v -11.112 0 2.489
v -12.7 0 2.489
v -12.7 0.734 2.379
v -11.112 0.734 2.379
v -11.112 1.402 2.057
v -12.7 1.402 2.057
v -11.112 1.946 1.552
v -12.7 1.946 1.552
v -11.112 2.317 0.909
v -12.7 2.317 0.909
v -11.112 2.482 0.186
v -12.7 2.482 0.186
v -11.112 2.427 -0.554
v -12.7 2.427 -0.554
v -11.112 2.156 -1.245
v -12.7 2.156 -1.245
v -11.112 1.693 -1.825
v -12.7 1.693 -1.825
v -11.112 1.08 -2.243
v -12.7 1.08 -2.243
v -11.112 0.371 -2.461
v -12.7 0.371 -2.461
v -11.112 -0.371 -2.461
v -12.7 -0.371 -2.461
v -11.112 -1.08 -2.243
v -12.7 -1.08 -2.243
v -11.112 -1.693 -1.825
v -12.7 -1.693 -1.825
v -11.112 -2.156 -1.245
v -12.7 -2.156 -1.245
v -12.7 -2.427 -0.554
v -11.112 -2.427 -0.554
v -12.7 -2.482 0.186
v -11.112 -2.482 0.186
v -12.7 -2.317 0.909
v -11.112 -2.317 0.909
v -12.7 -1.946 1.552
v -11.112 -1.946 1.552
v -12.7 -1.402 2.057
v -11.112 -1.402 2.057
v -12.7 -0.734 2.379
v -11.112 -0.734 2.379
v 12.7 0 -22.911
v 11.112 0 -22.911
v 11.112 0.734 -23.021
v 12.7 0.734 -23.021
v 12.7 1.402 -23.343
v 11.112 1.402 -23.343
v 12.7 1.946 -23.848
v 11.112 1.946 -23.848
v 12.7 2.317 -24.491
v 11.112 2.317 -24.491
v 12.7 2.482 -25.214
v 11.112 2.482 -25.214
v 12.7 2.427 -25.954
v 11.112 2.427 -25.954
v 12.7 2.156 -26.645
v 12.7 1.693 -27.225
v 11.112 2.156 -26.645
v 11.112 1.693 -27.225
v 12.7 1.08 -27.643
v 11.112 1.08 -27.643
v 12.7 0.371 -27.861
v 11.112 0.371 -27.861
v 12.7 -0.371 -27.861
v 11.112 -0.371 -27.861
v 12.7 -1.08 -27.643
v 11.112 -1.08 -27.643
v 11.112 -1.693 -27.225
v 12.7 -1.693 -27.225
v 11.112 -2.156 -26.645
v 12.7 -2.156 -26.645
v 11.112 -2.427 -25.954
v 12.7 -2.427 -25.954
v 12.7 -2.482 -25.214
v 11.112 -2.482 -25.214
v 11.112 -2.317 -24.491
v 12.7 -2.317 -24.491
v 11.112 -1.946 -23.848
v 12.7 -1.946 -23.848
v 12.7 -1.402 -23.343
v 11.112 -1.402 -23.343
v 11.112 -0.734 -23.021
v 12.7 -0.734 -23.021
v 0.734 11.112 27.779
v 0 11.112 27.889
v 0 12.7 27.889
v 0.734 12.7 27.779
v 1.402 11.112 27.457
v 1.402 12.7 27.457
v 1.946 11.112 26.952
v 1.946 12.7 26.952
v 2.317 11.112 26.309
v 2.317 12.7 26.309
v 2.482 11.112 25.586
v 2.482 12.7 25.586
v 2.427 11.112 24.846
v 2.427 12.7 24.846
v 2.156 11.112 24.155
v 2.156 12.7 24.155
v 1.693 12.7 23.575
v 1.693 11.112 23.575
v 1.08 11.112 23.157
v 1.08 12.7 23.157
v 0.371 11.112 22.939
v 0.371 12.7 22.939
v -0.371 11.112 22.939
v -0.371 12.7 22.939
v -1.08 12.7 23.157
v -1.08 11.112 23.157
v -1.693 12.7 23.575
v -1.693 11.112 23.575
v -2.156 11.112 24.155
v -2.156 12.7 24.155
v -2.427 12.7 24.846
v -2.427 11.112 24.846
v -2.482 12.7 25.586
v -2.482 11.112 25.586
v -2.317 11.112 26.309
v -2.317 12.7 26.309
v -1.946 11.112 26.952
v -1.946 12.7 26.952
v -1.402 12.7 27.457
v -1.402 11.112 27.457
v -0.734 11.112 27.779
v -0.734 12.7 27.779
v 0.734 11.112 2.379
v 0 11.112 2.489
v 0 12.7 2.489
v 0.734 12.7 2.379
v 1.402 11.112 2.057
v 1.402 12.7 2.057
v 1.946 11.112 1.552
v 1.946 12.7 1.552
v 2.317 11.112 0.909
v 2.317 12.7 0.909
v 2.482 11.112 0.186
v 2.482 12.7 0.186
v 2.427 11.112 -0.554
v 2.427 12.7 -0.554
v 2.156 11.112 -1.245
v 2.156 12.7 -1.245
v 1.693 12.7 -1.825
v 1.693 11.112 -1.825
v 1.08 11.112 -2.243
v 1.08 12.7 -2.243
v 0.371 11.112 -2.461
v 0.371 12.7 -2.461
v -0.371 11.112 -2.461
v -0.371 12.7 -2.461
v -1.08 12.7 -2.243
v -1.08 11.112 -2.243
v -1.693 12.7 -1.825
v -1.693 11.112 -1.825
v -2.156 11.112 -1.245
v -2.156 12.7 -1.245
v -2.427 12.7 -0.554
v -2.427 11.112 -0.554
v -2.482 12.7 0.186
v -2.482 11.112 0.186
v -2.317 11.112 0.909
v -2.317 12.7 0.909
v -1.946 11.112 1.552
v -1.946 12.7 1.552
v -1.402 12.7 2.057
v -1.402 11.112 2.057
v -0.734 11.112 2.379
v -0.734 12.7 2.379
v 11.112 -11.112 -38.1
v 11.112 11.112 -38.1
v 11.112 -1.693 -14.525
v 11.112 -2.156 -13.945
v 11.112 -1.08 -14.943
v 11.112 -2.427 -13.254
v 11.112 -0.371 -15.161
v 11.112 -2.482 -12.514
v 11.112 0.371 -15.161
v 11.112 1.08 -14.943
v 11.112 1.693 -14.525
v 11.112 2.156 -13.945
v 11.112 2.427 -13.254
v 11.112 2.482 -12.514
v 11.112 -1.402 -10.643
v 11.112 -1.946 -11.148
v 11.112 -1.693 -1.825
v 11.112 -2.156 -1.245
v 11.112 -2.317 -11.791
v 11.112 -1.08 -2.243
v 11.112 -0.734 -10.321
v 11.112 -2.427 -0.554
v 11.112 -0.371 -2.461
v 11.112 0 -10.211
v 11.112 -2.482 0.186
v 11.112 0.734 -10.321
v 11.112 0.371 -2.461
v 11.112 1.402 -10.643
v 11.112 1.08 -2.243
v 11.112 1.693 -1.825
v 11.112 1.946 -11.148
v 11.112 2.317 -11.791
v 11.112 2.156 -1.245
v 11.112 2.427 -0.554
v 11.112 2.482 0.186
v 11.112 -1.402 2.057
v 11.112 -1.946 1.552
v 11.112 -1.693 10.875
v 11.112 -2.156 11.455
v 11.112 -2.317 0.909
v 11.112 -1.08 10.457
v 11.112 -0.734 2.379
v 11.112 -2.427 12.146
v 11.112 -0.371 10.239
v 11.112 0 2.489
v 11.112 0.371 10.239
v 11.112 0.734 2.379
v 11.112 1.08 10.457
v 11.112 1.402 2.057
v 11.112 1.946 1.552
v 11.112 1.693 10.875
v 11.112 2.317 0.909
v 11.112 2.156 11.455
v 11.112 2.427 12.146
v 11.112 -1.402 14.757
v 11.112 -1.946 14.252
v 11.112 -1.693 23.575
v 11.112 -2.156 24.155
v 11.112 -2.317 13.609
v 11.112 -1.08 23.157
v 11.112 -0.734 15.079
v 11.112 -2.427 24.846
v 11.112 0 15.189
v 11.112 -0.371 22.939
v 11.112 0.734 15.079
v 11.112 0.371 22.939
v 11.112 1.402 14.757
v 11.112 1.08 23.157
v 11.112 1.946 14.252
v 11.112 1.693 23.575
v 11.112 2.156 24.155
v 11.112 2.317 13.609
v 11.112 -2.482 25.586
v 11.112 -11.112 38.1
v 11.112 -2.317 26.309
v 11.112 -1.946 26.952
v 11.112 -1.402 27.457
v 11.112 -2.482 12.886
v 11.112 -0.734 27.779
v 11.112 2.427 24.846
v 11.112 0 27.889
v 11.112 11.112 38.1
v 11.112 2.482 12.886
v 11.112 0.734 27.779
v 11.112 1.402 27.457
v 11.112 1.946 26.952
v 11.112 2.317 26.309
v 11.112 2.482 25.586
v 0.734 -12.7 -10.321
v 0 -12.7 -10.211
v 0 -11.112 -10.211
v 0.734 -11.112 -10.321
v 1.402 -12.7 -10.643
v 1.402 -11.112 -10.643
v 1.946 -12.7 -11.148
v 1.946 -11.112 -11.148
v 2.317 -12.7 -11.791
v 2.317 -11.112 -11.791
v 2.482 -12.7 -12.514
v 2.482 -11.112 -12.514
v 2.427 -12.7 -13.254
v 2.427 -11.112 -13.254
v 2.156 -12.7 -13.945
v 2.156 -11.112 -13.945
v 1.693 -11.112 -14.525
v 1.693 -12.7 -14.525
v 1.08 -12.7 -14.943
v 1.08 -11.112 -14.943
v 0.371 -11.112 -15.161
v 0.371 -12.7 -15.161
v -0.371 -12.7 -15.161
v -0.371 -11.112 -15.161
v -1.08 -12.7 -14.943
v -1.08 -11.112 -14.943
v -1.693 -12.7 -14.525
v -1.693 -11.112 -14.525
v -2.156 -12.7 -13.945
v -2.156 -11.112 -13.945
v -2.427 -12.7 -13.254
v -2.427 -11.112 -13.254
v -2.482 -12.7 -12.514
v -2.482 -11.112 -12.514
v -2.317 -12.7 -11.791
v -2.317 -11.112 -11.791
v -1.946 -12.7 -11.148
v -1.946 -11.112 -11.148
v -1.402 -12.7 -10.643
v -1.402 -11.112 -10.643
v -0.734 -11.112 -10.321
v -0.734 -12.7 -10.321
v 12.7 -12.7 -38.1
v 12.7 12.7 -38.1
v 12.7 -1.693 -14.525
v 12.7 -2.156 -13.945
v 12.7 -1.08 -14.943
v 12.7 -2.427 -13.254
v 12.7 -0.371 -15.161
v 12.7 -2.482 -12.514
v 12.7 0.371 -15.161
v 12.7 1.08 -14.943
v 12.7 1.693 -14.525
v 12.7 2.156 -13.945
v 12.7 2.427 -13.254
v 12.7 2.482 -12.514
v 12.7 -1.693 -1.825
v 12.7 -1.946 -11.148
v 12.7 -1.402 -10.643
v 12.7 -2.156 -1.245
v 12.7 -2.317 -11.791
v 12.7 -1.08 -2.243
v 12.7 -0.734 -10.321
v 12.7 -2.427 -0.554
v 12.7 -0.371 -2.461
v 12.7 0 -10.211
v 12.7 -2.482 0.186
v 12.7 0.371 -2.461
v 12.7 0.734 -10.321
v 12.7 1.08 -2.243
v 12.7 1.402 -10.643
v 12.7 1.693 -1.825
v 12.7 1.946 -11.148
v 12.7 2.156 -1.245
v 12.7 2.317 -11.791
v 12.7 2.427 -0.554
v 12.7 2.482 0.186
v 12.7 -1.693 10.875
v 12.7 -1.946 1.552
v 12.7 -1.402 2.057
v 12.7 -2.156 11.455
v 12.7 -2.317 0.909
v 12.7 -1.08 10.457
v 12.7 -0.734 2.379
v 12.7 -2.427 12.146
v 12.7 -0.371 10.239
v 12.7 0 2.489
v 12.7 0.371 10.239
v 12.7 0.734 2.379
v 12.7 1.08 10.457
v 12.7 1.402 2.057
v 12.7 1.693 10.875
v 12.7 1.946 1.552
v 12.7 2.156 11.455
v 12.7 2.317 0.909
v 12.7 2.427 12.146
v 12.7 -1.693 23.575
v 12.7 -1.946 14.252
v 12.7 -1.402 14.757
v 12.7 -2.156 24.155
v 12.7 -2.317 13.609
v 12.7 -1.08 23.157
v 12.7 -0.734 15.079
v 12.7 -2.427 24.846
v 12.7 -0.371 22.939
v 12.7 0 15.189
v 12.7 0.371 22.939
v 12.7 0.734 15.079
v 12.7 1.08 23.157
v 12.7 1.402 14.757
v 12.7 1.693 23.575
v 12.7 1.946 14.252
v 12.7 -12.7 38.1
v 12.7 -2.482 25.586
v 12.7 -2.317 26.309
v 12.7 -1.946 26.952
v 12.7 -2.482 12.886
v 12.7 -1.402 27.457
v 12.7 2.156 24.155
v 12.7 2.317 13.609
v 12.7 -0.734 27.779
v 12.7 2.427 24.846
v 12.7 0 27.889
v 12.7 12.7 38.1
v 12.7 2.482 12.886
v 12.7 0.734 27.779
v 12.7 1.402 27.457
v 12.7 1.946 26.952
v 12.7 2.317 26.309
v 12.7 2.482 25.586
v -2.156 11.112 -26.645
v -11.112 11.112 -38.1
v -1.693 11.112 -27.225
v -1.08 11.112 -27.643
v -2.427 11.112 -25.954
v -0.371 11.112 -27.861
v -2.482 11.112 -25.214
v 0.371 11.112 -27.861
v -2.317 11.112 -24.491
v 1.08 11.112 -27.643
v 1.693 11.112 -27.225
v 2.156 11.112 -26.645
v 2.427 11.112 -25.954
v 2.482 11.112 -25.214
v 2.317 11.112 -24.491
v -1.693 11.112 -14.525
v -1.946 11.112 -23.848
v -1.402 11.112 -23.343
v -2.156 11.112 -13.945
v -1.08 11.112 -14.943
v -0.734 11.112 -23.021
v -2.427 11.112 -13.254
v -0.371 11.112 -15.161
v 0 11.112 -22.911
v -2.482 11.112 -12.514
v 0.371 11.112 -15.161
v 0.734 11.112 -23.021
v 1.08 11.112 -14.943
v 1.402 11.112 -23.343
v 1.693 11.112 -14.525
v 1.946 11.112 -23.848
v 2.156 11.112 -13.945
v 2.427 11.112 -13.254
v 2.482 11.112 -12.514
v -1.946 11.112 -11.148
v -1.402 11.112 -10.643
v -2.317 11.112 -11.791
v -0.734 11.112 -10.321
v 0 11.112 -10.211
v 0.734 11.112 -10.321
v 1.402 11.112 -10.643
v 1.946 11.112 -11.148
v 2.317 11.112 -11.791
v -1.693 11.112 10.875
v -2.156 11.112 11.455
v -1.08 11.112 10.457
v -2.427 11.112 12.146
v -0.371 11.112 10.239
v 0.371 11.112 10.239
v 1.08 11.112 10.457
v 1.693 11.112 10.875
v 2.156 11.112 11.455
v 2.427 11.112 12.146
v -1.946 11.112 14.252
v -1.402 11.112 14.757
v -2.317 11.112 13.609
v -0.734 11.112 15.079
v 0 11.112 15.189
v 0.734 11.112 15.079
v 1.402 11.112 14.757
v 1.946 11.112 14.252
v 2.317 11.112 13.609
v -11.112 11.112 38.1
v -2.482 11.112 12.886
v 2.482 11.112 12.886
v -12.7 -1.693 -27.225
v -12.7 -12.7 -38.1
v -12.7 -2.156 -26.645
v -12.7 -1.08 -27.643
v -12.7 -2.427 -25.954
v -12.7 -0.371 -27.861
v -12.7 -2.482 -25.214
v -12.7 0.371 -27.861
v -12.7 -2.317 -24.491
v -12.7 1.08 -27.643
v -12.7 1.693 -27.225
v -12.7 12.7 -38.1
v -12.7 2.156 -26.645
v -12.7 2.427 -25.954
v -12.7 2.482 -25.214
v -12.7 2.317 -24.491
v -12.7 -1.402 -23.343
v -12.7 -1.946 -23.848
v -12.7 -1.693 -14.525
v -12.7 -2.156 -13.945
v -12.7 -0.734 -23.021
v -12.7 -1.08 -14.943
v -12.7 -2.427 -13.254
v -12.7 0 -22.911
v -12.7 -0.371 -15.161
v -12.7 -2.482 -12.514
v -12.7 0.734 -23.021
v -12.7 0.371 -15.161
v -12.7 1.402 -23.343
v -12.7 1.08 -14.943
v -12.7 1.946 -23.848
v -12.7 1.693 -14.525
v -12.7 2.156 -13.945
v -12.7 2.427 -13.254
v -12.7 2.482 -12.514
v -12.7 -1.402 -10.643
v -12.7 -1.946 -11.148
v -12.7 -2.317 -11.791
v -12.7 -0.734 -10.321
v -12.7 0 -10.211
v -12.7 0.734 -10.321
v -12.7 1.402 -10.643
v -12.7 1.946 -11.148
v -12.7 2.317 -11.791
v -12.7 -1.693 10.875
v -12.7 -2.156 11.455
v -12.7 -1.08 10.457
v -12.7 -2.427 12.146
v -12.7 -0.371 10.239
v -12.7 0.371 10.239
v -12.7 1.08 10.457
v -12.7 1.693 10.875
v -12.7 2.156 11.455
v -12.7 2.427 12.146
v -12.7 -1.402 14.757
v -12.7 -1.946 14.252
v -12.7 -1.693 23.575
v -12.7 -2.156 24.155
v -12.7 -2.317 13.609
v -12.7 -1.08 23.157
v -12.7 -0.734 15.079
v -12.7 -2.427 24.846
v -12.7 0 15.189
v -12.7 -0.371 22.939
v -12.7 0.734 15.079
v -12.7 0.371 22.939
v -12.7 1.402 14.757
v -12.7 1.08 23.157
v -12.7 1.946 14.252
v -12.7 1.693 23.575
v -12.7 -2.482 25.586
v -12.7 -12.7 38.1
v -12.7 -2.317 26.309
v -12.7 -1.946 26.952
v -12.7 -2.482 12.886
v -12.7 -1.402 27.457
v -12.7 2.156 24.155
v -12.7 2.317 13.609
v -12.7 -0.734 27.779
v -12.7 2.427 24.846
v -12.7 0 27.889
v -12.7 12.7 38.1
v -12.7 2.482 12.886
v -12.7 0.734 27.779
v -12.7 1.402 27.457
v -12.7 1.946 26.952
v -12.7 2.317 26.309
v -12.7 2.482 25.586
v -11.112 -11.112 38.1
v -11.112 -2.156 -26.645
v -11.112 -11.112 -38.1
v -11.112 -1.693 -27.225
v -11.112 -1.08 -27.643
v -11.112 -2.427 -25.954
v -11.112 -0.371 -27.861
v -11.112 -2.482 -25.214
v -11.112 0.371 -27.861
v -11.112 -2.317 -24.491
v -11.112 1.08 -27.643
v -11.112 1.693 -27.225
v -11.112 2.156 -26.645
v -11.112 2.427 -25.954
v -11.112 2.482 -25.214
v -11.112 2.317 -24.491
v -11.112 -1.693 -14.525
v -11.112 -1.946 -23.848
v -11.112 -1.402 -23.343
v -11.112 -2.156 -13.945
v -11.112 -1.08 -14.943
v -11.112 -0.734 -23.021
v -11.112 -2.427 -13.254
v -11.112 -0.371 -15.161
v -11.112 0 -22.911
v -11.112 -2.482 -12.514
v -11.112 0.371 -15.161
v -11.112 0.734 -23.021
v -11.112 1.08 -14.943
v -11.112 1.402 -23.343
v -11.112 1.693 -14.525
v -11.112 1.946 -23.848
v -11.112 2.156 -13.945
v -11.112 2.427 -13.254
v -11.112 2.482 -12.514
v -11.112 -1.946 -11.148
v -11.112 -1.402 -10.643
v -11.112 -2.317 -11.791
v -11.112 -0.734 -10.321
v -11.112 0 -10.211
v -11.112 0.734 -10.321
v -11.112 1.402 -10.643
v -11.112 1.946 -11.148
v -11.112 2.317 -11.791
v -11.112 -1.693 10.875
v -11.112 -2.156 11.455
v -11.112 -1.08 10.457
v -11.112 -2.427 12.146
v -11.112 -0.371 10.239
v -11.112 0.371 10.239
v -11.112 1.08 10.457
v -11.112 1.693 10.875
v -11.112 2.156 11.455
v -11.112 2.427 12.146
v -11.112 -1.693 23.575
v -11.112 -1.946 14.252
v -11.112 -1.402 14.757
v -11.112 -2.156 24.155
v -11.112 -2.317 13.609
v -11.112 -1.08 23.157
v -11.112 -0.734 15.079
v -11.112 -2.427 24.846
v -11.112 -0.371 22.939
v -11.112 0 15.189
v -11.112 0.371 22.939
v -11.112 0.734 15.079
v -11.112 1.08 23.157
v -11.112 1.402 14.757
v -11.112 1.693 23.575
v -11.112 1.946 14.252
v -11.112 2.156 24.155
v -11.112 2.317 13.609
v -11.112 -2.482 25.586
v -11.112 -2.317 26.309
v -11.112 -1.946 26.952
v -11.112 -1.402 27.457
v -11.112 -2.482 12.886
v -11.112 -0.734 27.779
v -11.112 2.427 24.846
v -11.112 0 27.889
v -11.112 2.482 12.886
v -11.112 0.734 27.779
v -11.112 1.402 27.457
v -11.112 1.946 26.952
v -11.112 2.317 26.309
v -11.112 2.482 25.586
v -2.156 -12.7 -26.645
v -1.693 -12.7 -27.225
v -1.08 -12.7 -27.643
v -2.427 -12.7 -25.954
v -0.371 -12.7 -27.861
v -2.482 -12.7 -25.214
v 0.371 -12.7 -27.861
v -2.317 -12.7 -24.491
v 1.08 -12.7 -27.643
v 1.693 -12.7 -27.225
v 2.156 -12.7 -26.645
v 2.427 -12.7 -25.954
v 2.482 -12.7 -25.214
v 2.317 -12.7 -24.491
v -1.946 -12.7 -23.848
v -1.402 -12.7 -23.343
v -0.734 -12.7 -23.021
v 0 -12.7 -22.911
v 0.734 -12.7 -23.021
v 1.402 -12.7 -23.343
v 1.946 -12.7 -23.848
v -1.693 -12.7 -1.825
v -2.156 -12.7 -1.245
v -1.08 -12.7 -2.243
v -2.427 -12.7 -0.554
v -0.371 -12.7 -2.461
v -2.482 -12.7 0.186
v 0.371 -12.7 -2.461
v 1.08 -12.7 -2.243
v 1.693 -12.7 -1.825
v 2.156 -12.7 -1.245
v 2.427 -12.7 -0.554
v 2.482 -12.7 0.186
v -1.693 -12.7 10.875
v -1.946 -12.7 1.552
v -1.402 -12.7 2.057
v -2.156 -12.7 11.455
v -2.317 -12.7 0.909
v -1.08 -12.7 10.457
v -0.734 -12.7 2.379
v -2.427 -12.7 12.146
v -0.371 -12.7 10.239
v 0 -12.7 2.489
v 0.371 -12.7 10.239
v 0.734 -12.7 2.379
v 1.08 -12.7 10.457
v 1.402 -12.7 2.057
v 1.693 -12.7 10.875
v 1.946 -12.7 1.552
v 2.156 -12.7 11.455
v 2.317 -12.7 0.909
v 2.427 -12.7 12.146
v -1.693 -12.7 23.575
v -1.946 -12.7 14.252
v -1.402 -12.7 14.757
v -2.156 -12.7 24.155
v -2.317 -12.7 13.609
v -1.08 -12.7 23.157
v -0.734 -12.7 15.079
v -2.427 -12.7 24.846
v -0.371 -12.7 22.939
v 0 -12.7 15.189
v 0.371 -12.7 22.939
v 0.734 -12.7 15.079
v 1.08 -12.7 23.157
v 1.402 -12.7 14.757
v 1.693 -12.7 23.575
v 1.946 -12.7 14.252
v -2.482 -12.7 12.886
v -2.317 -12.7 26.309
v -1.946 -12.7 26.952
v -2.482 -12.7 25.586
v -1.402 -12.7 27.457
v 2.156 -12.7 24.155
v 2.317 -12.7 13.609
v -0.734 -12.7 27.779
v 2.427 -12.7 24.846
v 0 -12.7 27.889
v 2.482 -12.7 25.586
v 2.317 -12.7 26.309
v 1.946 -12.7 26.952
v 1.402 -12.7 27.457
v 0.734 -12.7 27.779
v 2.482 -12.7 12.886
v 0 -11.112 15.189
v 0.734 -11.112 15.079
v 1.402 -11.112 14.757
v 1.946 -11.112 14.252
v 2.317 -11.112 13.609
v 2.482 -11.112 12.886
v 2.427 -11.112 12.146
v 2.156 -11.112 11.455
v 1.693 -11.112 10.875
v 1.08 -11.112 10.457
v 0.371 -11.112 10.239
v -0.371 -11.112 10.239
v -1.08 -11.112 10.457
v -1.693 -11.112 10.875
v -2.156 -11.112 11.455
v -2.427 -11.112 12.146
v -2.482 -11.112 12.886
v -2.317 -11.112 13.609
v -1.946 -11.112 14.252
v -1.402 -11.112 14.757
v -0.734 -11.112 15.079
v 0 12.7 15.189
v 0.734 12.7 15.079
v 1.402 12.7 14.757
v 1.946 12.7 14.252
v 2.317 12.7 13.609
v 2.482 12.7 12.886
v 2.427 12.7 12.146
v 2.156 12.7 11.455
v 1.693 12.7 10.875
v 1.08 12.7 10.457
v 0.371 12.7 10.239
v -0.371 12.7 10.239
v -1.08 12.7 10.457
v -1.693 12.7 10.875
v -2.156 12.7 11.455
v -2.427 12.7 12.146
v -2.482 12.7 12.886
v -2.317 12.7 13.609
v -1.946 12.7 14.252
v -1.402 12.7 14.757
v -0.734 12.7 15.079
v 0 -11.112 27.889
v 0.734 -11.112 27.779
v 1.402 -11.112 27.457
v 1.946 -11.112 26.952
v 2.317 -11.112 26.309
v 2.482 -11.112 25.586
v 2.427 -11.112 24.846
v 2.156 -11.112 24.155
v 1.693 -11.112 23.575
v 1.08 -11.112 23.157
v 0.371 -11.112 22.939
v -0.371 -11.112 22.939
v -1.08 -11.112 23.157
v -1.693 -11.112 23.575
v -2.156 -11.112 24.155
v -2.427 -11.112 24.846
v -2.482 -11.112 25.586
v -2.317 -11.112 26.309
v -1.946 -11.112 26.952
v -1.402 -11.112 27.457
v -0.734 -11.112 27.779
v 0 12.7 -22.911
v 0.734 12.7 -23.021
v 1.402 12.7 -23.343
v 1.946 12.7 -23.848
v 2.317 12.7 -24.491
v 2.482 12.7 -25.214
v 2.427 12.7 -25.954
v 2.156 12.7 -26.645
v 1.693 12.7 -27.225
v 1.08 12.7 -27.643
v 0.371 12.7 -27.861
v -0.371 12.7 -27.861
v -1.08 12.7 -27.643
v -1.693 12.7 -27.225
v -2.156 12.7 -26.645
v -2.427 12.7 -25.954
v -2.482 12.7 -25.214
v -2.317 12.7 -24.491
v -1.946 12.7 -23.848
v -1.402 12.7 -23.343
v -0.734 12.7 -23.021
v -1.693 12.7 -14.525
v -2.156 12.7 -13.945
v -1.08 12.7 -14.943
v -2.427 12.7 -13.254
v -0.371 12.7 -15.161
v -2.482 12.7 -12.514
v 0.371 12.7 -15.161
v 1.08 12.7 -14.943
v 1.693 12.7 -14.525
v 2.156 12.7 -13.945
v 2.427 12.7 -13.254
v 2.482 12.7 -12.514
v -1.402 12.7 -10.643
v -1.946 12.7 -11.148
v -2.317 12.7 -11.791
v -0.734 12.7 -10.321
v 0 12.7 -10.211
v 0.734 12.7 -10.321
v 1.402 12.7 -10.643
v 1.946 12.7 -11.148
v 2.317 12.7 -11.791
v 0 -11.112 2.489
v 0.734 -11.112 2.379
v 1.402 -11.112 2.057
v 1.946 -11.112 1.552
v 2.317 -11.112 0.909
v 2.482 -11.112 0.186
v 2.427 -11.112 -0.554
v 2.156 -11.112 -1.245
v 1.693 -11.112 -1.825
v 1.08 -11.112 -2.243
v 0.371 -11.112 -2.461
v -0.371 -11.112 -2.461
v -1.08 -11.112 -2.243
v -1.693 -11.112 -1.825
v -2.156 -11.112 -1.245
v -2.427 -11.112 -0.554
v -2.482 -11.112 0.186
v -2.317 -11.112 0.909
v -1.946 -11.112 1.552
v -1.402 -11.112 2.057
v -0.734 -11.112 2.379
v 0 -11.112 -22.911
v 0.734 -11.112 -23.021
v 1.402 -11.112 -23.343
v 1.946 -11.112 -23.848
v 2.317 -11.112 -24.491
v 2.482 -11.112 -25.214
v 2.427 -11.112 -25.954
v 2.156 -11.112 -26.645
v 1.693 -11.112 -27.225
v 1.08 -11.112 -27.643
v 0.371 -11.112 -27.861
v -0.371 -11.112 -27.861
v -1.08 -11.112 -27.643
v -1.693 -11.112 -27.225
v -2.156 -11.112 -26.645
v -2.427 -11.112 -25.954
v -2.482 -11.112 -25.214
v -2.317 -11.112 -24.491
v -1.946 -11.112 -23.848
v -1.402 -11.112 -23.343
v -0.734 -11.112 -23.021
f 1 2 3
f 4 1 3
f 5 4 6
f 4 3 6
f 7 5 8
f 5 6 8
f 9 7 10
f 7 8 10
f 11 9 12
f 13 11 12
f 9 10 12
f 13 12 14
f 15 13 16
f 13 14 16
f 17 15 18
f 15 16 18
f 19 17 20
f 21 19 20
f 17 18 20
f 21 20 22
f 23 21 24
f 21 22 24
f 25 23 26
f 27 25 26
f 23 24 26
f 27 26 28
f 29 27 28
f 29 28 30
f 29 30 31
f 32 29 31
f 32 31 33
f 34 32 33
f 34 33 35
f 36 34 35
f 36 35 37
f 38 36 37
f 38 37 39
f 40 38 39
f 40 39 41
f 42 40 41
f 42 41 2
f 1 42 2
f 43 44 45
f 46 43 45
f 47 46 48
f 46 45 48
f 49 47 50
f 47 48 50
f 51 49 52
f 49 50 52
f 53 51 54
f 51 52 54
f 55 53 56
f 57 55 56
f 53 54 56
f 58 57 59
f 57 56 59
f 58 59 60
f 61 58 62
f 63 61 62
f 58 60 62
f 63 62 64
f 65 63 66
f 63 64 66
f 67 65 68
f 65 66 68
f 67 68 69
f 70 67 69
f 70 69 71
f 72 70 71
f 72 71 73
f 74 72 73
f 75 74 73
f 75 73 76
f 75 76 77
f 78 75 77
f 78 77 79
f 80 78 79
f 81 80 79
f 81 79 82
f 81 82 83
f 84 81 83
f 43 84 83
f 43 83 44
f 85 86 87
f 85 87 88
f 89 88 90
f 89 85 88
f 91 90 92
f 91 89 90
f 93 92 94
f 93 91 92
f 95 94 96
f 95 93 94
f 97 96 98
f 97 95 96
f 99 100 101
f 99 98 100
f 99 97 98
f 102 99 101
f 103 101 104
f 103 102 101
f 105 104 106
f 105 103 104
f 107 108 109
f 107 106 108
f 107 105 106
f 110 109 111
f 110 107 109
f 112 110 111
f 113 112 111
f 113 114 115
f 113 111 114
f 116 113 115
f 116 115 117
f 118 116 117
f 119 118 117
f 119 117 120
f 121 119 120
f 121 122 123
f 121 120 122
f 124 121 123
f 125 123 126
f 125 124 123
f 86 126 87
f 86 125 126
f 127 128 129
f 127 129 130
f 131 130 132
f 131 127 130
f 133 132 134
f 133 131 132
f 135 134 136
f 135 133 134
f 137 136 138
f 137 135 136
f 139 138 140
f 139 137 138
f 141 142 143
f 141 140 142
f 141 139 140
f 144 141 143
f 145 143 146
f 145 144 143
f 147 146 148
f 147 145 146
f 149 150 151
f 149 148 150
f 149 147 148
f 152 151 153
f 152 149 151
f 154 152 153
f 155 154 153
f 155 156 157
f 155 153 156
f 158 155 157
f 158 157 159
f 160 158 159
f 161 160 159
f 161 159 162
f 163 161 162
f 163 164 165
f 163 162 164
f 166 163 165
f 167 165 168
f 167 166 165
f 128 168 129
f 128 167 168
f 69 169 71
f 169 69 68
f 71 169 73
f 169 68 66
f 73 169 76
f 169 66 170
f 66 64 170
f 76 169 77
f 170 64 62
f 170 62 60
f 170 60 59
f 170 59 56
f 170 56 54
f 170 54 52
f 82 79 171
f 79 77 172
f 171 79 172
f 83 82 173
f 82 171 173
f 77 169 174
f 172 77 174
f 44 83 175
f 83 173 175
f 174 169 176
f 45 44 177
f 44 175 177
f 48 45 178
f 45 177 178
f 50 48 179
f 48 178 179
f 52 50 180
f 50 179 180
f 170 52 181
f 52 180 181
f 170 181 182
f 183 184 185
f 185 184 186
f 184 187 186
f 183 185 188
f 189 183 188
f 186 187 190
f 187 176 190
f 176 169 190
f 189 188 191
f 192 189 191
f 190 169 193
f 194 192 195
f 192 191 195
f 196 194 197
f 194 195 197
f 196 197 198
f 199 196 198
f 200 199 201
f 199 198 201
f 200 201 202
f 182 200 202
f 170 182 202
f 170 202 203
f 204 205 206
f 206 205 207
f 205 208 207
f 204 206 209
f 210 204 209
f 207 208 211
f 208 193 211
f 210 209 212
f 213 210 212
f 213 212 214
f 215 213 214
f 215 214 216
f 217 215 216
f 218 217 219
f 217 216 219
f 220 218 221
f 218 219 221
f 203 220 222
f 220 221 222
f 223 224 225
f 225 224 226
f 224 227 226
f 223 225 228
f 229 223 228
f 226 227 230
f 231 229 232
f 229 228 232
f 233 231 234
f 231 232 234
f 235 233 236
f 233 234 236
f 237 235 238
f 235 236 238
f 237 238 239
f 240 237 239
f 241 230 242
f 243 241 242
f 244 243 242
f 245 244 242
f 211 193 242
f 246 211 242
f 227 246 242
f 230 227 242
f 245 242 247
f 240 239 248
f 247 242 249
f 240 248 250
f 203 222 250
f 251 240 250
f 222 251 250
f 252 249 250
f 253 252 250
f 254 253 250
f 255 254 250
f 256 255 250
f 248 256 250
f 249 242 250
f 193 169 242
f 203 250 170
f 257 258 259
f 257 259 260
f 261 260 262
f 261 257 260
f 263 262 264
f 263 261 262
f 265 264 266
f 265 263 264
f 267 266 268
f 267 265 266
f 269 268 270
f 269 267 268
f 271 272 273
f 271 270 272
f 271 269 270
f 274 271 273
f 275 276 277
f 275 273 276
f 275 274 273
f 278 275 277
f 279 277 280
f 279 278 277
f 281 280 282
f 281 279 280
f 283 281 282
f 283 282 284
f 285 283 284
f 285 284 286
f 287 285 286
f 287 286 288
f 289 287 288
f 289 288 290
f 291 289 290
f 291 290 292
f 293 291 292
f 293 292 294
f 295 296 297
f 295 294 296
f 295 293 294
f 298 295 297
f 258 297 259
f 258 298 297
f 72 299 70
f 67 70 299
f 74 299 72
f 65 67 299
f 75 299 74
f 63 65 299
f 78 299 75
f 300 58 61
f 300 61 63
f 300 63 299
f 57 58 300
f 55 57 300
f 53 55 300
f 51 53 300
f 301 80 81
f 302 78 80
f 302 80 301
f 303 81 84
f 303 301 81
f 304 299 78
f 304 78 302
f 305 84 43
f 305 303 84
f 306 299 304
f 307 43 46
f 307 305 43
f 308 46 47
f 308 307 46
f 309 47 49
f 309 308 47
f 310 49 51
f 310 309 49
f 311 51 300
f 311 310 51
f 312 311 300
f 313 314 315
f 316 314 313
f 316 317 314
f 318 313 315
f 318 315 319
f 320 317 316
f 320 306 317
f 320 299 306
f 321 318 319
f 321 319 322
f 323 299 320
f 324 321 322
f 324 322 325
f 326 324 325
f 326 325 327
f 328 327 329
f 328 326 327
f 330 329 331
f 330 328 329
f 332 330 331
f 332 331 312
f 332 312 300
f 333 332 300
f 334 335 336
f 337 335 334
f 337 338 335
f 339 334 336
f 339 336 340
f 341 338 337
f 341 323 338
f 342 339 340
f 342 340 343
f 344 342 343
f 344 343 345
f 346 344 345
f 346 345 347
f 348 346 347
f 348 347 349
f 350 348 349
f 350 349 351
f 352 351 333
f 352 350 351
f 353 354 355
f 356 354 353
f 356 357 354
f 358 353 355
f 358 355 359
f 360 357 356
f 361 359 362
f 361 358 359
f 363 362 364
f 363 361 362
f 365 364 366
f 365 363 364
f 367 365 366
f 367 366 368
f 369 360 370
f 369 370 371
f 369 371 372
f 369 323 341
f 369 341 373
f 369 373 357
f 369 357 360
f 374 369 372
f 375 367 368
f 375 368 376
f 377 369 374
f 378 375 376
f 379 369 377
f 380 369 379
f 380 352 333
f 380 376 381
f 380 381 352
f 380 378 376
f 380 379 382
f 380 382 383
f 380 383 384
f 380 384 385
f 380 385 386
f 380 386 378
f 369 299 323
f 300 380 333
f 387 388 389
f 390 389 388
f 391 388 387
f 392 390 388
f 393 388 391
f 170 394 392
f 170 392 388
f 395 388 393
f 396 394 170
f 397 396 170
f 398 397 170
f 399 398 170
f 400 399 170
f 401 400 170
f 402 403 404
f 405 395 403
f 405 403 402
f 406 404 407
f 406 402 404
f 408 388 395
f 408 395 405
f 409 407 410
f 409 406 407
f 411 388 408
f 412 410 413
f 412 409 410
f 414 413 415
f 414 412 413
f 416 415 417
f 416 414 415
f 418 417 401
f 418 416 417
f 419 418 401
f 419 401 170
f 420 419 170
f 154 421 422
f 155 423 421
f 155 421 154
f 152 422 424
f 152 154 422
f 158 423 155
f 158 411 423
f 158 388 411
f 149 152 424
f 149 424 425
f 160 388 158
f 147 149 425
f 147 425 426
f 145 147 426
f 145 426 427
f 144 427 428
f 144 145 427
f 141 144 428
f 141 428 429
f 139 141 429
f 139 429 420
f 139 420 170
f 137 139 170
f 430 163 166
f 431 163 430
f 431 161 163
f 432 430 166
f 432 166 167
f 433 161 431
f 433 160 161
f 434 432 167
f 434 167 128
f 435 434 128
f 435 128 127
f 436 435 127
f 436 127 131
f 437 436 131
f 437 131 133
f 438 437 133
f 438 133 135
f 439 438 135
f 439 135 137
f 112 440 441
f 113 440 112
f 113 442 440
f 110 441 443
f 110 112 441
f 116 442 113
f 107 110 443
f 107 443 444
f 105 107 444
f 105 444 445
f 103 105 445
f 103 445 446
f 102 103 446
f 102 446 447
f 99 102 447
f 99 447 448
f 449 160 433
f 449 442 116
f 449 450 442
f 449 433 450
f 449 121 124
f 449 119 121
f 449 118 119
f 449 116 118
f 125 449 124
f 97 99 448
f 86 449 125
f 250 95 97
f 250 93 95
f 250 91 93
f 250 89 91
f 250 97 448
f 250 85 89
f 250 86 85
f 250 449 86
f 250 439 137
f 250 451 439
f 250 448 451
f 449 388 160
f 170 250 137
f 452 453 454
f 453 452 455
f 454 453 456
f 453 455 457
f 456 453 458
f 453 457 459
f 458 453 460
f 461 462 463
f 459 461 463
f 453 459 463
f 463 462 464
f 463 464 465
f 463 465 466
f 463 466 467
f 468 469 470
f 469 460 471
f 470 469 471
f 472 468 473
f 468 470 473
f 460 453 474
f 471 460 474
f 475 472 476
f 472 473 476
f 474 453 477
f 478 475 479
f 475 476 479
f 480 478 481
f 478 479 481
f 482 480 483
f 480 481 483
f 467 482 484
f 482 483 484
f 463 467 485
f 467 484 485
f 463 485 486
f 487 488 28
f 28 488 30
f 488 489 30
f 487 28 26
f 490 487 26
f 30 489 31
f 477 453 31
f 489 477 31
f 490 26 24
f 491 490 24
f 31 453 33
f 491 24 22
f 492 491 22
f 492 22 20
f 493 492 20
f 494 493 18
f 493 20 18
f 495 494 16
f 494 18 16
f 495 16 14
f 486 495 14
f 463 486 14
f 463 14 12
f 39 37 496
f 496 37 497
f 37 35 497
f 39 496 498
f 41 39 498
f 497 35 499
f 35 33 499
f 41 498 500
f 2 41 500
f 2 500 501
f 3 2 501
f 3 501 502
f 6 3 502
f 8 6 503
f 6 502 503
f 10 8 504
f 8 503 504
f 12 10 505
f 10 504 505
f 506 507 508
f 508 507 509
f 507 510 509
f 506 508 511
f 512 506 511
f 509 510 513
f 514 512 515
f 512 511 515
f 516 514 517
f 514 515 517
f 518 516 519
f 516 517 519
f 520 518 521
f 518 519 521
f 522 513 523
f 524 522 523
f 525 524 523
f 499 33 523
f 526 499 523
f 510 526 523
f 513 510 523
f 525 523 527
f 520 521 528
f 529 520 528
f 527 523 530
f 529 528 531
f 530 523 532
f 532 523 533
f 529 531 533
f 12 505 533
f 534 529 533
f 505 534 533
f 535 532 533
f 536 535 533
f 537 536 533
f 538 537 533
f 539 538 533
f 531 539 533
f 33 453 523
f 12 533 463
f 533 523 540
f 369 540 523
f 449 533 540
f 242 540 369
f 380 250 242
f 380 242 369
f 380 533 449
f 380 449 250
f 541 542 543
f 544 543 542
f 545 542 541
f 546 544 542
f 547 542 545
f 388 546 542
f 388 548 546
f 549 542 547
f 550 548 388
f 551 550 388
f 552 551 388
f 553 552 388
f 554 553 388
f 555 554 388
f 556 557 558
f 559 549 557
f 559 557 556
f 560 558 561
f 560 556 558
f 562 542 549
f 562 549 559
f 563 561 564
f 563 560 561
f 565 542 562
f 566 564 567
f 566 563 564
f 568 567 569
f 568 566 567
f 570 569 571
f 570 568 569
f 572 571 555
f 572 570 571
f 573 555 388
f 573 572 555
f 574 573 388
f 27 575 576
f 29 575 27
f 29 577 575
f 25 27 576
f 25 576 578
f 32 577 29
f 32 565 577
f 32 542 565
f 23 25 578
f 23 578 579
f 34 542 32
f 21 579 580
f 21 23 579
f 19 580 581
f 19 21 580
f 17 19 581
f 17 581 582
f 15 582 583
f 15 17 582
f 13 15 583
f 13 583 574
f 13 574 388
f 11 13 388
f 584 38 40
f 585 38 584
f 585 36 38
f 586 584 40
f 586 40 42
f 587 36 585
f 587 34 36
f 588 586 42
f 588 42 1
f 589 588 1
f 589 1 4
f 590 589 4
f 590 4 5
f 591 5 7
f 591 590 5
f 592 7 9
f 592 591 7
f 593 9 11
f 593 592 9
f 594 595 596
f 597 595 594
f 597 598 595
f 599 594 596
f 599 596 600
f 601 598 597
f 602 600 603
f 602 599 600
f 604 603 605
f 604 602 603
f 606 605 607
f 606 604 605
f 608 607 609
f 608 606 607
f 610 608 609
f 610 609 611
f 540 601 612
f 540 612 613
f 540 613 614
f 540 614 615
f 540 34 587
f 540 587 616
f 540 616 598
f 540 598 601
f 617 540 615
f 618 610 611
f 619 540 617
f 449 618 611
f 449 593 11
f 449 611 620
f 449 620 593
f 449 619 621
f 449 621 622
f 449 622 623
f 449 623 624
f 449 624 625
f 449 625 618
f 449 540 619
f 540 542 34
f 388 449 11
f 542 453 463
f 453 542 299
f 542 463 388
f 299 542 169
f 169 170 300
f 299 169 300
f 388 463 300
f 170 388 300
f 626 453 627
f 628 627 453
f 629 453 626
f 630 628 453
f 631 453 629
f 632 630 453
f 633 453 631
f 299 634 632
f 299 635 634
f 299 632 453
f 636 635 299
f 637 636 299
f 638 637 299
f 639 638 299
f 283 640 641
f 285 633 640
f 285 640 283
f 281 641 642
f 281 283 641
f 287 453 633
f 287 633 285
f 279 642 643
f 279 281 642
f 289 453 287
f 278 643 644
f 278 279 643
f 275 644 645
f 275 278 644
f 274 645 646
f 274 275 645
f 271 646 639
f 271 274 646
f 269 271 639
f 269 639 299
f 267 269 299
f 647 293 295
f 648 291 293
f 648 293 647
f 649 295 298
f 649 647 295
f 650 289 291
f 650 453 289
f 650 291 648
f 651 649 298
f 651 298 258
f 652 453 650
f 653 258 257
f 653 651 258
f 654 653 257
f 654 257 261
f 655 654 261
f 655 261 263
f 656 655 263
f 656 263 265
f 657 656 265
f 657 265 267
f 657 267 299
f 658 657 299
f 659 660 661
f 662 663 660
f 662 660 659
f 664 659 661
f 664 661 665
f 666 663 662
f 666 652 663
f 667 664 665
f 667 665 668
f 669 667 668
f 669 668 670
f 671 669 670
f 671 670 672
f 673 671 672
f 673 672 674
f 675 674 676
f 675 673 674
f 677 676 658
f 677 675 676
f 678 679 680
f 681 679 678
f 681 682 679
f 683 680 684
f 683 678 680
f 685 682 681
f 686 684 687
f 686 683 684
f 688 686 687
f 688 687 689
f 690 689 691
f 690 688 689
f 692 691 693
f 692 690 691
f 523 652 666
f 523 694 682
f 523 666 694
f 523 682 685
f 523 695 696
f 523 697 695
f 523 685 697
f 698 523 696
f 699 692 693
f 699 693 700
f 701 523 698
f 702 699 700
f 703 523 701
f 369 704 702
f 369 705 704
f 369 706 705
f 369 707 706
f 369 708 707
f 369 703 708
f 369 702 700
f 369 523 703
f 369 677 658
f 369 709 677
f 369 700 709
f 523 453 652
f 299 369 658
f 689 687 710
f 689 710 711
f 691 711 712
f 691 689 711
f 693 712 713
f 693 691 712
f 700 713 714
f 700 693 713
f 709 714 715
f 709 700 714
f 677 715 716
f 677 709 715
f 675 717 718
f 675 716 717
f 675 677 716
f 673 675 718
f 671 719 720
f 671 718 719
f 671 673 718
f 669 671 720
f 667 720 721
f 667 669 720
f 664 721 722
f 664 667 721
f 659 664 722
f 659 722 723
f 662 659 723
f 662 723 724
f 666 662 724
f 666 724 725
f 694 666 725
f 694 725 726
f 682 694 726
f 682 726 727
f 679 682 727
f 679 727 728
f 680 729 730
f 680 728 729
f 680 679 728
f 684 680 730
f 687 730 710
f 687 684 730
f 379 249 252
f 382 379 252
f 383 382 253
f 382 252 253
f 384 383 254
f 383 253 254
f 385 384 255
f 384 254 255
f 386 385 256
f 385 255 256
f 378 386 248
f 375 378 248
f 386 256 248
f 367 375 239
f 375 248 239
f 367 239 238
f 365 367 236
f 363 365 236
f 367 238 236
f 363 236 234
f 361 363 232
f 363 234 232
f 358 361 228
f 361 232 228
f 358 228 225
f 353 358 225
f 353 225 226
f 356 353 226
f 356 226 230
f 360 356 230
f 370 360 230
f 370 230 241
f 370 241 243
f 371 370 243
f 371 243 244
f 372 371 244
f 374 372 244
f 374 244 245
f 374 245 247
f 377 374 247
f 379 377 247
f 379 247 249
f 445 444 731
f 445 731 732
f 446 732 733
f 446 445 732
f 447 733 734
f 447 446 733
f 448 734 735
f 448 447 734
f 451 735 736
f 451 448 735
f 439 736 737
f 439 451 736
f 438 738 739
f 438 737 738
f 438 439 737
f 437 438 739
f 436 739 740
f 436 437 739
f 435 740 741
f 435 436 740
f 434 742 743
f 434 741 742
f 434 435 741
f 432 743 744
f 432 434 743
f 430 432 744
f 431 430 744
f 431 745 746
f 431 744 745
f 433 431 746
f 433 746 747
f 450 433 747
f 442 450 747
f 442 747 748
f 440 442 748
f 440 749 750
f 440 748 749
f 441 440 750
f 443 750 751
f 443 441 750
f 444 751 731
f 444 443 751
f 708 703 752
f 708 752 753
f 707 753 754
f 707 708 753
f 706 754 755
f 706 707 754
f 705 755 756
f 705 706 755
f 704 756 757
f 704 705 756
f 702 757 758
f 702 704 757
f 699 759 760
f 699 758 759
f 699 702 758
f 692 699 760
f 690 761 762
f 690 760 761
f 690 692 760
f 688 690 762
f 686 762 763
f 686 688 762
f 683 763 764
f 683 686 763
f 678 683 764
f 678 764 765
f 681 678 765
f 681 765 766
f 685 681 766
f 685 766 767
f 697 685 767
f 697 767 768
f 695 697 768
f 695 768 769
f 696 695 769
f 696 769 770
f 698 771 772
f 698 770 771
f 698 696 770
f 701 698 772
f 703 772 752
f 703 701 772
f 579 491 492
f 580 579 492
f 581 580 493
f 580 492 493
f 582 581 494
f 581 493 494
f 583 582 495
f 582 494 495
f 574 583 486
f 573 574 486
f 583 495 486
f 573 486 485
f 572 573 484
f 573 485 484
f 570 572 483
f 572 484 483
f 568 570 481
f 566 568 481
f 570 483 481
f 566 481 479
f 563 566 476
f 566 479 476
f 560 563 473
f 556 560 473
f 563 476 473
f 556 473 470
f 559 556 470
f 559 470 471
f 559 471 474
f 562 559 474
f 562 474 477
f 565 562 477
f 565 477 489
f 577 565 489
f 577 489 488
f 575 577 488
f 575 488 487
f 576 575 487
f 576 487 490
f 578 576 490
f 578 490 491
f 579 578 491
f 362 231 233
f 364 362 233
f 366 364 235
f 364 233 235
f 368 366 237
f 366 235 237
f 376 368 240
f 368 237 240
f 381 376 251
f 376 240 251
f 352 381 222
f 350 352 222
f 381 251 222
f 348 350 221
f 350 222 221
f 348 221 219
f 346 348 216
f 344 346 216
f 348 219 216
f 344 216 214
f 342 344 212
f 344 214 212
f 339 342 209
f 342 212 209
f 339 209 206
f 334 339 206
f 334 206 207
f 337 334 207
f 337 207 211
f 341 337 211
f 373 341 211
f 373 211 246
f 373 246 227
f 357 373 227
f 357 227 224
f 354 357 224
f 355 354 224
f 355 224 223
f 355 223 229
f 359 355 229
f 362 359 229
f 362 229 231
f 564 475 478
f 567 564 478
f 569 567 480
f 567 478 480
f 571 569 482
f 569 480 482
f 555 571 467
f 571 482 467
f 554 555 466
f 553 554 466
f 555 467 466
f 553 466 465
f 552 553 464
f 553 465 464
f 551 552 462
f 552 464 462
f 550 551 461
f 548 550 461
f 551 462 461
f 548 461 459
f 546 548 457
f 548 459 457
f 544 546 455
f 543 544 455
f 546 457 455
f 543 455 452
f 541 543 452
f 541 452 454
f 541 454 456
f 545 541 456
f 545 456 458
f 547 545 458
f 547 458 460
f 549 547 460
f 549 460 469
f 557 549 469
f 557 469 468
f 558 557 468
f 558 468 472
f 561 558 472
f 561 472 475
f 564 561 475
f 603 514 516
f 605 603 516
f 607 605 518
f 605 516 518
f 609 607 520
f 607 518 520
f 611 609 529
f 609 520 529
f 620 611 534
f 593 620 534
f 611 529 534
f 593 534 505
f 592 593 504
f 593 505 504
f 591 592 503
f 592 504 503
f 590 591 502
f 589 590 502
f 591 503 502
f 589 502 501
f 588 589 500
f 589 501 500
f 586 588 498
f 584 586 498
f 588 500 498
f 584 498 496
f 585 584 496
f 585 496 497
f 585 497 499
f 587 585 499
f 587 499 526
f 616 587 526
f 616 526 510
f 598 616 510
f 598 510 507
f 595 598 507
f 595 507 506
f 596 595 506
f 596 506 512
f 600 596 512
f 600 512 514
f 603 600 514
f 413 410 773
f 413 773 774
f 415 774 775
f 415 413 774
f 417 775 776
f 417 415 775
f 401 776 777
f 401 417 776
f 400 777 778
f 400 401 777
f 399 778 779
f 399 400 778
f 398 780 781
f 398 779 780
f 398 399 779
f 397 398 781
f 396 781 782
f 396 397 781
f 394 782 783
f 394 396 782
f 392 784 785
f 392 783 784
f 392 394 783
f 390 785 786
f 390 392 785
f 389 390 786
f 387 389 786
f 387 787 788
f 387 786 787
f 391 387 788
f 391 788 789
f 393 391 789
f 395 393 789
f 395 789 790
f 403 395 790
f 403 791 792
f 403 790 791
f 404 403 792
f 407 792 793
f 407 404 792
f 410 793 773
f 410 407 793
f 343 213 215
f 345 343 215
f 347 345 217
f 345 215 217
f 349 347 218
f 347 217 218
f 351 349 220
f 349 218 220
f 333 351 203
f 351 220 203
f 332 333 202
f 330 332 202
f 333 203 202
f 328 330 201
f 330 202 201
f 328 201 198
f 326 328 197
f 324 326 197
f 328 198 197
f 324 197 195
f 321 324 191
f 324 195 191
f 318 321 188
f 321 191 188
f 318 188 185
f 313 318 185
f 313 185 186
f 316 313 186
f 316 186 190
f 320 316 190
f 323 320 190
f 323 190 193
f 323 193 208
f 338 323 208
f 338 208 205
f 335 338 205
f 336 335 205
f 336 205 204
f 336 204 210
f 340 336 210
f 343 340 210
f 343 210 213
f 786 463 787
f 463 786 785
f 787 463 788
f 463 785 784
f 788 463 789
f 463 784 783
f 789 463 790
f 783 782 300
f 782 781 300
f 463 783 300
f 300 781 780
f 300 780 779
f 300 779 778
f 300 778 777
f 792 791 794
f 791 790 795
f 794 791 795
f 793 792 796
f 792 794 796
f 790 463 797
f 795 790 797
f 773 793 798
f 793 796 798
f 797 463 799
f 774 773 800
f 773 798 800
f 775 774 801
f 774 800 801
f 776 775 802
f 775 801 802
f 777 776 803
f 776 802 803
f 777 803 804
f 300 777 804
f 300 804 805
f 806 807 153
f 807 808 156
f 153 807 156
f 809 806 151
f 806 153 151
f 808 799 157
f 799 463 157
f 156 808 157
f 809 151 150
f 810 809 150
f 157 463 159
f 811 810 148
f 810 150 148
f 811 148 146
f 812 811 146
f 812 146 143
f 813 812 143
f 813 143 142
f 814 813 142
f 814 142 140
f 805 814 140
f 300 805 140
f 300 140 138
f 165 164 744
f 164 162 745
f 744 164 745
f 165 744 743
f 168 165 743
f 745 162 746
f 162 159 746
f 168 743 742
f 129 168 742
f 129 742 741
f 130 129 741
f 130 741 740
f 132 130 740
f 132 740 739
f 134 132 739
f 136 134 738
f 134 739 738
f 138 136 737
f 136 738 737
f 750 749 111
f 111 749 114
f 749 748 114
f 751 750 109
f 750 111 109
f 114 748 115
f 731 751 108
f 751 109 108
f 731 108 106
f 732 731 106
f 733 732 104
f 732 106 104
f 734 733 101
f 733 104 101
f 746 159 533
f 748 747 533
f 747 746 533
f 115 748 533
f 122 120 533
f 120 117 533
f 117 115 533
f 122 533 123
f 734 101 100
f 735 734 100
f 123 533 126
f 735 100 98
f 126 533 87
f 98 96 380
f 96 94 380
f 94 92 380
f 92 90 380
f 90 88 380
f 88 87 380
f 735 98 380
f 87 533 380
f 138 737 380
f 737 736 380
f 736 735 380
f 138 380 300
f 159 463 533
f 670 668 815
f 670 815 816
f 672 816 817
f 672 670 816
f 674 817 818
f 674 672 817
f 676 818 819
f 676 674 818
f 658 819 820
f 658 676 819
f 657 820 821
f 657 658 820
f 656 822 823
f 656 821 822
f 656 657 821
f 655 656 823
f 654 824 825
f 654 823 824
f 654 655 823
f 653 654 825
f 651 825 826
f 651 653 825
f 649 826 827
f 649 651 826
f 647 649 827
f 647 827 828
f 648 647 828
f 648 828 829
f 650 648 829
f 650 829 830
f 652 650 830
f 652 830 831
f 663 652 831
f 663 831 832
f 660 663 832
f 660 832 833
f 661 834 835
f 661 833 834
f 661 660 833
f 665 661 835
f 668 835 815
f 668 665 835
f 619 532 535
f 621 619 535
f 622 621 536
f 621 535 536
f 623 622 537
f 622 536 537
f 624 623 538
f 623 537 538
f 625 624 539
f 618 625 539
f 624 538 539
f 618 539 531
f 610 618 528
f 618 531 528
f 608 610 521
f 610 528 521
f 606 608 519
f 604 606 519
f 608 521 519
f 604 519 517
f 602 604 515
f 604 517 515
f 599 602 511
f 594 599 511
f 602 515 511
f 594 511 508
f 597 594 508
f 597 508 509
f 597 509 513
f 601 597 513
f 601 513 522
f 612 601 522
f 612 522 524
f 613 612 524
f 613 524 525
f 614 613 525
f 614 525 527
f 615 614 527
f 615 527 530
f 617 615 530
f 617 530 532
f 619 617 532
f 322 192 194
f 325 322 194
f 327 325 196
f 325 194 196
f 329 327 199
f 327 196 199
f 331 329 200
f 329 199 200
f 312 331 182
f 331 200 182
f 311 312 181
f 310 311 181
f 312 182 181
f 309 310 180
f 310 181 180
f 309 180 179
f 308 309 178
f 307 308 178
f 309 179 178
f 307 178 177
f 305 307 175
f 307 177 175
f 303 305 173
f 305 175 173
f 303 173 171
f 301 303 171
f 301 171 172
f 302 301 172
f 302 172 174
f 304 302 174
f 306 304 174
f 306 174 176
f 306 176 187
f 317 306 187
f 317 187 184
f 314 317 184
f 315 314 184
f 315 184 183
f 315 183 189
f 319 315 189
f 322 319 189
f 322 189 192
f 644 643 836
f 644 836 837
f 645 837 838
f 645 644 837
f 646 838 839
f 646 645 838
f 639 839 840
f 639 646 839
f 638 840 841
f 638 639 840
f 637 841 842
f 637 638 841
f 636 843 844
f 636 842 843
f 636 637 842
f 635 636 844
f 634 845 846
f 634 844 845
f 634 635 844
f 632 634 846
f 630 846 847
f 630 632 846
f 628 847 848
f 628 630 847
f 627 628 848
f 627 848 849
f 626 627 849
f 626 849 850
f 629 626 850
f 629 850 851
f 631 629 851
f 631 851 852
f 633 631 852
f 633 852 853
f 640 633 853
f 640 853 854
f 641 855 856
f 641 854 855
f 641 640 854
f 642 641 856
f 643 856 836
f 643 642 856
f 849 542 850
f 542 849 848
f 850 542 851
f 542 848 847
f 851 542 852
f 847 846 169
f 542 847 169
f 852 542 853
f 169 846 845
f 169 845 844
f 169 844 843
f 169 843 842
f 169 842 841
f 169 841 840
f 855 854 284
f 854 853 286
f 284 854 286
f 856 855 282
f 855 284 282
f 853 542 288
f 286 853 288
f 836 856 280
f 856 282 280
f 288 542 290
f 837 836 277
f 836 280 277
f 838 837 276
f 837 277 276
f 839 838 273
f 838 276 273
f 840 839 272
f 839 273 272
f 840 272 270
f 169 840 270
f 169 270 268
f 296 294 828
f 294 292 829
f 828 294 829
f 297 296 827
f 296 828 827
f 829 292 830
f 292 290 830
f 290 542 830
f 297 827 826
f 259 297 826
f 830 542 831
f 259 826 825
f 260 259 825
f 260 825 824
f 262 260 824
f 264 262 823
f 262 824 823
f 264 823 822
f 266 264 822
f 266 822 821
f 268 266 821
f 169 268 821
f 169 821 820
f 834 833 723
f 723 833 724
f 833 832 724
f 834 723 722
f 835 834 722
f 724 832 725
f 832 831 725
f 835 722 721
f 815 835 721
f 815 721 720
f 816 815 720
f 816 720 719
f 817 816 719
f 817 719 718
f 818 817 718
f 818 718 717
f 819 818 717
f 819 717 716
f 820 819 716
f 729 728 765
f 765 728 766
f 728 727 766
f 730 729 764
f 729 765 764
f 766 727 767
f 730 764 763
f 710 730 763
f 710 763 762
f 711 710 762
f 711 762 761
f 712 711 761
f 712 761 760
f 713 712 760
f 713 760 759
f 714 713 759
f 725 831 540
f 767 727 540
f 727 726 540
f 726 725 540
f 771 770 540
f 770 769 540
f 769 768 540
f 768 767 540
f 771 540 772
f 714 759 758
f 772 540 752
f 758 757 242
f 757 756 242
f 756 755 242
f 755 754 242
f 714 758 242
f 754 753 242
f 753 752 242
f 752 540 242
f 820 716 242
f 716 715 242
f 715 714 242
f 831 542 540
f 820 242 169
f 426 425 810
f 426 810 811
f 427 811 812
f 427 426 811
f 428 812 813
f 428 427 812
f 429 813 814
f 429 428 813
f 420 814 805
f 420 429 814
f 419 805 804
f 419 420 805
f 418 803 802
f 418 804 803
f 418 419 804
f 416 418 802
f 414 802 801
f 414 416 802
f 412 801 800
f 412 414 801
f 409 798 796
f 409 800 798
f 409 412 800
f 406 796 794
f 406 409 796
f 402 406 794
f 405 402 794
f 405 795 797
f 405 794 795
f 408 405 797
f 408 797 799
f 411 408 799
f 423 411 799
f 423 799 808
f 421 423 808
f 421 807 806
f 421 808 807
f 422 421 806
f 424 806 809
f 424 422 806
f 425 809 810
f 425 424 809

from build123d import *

# Parameters (mm, degrees)
SKETCH1_W               = 25.4
SKETCH1_H               = 25.4
BOSS_EXTRUDE1_DEPTH     = 38.1
SHELL1_T                = -1.5875
CUT_EXTRUDE1_DEPTH      = 43.121134838
CUT_EXTRUDE1_DEPTH_BACK = 43.121134838
SKETCH2_R               = 2.4892
SKETCH3_R               = 2.4892
CUT_EXTRUDE2_DEPTH      = 48.519048812


with BuildPart() as part:
    # Sketch1 → Boss-Extrude1 (new, symmetric)
    with BuildSketch(Plane.XY):
        Rectangle(SKETCH1_W, SKETCH1_H)
    extrude(amount=BOSS_EXTRUDE1_DEPTH, both=True)

    # Shell1
    shell1_openings = [part.faces().sort_by_distance(p)[0] for p in [
        (0, 0, 38.1),
        (0, 0, -38.1),
    ]]
    offset(amount=SHELL1_T, openings=shell1_openings, kind=Kind.INTERSECTION)

    # Sketch2 → Cut-Extrude1 (cut, two sides: drawn at the far end of the back side and taken through both)
    with BuildSketch(Plane(origin=(0, 0, 0), x_dir=(1, 0, 0), z_dir=(0, 1, 0)).offset(-CUT_EXTRUDE1_DEPTH_BACK)):
        with Locations(Location((0, -25.4, 0), (0, 0, 270))):
            Circle(SKETCH2_R)
        with Locations(Location((0, -12.7, 0), (0, 0, 270))):
            Circle(SKETCH2_R)
        with Locations(Location((0, 0, 0), (0, 0, 270))):
            Circle(SKETCH2_R)
        with Locations(Location((0, 12.7, 0), (0, 0, 270))):
            Circle(SKETCH2_R)
        with Locations(Location((0, 25.4, 0), (0, 0, 270))):
            Circle(SKETCH2_R)
    extrude(amount=CUT_EXTRUDE1_DEPTH + CUT_EXTRUDE1_DEPTH_BACK, mode=Mode.SUBTRACT)

    # Sketch3 → Cut-Extrude2 (cut, through all)
    with BuildSketch(Plane.ZY.offset(12.7)):
        with Locations((-25.4, 0)):
            Circle(SKETCH3_R)
        with Locations((-12.7, 0)):
            Circle(SKETCH3_R)
        Circle(SKETCH3_R)
        with Locations((12.7, 0)):
            Circle(SKETCH3_R)
        with Locations((25.4, 0)):
            Circle(SKETCH3_R)
    extrude(amount=-CUT_EXTRUDE2_DEPTH, mode=Mode.SUBTRACT)


solid = part.part
